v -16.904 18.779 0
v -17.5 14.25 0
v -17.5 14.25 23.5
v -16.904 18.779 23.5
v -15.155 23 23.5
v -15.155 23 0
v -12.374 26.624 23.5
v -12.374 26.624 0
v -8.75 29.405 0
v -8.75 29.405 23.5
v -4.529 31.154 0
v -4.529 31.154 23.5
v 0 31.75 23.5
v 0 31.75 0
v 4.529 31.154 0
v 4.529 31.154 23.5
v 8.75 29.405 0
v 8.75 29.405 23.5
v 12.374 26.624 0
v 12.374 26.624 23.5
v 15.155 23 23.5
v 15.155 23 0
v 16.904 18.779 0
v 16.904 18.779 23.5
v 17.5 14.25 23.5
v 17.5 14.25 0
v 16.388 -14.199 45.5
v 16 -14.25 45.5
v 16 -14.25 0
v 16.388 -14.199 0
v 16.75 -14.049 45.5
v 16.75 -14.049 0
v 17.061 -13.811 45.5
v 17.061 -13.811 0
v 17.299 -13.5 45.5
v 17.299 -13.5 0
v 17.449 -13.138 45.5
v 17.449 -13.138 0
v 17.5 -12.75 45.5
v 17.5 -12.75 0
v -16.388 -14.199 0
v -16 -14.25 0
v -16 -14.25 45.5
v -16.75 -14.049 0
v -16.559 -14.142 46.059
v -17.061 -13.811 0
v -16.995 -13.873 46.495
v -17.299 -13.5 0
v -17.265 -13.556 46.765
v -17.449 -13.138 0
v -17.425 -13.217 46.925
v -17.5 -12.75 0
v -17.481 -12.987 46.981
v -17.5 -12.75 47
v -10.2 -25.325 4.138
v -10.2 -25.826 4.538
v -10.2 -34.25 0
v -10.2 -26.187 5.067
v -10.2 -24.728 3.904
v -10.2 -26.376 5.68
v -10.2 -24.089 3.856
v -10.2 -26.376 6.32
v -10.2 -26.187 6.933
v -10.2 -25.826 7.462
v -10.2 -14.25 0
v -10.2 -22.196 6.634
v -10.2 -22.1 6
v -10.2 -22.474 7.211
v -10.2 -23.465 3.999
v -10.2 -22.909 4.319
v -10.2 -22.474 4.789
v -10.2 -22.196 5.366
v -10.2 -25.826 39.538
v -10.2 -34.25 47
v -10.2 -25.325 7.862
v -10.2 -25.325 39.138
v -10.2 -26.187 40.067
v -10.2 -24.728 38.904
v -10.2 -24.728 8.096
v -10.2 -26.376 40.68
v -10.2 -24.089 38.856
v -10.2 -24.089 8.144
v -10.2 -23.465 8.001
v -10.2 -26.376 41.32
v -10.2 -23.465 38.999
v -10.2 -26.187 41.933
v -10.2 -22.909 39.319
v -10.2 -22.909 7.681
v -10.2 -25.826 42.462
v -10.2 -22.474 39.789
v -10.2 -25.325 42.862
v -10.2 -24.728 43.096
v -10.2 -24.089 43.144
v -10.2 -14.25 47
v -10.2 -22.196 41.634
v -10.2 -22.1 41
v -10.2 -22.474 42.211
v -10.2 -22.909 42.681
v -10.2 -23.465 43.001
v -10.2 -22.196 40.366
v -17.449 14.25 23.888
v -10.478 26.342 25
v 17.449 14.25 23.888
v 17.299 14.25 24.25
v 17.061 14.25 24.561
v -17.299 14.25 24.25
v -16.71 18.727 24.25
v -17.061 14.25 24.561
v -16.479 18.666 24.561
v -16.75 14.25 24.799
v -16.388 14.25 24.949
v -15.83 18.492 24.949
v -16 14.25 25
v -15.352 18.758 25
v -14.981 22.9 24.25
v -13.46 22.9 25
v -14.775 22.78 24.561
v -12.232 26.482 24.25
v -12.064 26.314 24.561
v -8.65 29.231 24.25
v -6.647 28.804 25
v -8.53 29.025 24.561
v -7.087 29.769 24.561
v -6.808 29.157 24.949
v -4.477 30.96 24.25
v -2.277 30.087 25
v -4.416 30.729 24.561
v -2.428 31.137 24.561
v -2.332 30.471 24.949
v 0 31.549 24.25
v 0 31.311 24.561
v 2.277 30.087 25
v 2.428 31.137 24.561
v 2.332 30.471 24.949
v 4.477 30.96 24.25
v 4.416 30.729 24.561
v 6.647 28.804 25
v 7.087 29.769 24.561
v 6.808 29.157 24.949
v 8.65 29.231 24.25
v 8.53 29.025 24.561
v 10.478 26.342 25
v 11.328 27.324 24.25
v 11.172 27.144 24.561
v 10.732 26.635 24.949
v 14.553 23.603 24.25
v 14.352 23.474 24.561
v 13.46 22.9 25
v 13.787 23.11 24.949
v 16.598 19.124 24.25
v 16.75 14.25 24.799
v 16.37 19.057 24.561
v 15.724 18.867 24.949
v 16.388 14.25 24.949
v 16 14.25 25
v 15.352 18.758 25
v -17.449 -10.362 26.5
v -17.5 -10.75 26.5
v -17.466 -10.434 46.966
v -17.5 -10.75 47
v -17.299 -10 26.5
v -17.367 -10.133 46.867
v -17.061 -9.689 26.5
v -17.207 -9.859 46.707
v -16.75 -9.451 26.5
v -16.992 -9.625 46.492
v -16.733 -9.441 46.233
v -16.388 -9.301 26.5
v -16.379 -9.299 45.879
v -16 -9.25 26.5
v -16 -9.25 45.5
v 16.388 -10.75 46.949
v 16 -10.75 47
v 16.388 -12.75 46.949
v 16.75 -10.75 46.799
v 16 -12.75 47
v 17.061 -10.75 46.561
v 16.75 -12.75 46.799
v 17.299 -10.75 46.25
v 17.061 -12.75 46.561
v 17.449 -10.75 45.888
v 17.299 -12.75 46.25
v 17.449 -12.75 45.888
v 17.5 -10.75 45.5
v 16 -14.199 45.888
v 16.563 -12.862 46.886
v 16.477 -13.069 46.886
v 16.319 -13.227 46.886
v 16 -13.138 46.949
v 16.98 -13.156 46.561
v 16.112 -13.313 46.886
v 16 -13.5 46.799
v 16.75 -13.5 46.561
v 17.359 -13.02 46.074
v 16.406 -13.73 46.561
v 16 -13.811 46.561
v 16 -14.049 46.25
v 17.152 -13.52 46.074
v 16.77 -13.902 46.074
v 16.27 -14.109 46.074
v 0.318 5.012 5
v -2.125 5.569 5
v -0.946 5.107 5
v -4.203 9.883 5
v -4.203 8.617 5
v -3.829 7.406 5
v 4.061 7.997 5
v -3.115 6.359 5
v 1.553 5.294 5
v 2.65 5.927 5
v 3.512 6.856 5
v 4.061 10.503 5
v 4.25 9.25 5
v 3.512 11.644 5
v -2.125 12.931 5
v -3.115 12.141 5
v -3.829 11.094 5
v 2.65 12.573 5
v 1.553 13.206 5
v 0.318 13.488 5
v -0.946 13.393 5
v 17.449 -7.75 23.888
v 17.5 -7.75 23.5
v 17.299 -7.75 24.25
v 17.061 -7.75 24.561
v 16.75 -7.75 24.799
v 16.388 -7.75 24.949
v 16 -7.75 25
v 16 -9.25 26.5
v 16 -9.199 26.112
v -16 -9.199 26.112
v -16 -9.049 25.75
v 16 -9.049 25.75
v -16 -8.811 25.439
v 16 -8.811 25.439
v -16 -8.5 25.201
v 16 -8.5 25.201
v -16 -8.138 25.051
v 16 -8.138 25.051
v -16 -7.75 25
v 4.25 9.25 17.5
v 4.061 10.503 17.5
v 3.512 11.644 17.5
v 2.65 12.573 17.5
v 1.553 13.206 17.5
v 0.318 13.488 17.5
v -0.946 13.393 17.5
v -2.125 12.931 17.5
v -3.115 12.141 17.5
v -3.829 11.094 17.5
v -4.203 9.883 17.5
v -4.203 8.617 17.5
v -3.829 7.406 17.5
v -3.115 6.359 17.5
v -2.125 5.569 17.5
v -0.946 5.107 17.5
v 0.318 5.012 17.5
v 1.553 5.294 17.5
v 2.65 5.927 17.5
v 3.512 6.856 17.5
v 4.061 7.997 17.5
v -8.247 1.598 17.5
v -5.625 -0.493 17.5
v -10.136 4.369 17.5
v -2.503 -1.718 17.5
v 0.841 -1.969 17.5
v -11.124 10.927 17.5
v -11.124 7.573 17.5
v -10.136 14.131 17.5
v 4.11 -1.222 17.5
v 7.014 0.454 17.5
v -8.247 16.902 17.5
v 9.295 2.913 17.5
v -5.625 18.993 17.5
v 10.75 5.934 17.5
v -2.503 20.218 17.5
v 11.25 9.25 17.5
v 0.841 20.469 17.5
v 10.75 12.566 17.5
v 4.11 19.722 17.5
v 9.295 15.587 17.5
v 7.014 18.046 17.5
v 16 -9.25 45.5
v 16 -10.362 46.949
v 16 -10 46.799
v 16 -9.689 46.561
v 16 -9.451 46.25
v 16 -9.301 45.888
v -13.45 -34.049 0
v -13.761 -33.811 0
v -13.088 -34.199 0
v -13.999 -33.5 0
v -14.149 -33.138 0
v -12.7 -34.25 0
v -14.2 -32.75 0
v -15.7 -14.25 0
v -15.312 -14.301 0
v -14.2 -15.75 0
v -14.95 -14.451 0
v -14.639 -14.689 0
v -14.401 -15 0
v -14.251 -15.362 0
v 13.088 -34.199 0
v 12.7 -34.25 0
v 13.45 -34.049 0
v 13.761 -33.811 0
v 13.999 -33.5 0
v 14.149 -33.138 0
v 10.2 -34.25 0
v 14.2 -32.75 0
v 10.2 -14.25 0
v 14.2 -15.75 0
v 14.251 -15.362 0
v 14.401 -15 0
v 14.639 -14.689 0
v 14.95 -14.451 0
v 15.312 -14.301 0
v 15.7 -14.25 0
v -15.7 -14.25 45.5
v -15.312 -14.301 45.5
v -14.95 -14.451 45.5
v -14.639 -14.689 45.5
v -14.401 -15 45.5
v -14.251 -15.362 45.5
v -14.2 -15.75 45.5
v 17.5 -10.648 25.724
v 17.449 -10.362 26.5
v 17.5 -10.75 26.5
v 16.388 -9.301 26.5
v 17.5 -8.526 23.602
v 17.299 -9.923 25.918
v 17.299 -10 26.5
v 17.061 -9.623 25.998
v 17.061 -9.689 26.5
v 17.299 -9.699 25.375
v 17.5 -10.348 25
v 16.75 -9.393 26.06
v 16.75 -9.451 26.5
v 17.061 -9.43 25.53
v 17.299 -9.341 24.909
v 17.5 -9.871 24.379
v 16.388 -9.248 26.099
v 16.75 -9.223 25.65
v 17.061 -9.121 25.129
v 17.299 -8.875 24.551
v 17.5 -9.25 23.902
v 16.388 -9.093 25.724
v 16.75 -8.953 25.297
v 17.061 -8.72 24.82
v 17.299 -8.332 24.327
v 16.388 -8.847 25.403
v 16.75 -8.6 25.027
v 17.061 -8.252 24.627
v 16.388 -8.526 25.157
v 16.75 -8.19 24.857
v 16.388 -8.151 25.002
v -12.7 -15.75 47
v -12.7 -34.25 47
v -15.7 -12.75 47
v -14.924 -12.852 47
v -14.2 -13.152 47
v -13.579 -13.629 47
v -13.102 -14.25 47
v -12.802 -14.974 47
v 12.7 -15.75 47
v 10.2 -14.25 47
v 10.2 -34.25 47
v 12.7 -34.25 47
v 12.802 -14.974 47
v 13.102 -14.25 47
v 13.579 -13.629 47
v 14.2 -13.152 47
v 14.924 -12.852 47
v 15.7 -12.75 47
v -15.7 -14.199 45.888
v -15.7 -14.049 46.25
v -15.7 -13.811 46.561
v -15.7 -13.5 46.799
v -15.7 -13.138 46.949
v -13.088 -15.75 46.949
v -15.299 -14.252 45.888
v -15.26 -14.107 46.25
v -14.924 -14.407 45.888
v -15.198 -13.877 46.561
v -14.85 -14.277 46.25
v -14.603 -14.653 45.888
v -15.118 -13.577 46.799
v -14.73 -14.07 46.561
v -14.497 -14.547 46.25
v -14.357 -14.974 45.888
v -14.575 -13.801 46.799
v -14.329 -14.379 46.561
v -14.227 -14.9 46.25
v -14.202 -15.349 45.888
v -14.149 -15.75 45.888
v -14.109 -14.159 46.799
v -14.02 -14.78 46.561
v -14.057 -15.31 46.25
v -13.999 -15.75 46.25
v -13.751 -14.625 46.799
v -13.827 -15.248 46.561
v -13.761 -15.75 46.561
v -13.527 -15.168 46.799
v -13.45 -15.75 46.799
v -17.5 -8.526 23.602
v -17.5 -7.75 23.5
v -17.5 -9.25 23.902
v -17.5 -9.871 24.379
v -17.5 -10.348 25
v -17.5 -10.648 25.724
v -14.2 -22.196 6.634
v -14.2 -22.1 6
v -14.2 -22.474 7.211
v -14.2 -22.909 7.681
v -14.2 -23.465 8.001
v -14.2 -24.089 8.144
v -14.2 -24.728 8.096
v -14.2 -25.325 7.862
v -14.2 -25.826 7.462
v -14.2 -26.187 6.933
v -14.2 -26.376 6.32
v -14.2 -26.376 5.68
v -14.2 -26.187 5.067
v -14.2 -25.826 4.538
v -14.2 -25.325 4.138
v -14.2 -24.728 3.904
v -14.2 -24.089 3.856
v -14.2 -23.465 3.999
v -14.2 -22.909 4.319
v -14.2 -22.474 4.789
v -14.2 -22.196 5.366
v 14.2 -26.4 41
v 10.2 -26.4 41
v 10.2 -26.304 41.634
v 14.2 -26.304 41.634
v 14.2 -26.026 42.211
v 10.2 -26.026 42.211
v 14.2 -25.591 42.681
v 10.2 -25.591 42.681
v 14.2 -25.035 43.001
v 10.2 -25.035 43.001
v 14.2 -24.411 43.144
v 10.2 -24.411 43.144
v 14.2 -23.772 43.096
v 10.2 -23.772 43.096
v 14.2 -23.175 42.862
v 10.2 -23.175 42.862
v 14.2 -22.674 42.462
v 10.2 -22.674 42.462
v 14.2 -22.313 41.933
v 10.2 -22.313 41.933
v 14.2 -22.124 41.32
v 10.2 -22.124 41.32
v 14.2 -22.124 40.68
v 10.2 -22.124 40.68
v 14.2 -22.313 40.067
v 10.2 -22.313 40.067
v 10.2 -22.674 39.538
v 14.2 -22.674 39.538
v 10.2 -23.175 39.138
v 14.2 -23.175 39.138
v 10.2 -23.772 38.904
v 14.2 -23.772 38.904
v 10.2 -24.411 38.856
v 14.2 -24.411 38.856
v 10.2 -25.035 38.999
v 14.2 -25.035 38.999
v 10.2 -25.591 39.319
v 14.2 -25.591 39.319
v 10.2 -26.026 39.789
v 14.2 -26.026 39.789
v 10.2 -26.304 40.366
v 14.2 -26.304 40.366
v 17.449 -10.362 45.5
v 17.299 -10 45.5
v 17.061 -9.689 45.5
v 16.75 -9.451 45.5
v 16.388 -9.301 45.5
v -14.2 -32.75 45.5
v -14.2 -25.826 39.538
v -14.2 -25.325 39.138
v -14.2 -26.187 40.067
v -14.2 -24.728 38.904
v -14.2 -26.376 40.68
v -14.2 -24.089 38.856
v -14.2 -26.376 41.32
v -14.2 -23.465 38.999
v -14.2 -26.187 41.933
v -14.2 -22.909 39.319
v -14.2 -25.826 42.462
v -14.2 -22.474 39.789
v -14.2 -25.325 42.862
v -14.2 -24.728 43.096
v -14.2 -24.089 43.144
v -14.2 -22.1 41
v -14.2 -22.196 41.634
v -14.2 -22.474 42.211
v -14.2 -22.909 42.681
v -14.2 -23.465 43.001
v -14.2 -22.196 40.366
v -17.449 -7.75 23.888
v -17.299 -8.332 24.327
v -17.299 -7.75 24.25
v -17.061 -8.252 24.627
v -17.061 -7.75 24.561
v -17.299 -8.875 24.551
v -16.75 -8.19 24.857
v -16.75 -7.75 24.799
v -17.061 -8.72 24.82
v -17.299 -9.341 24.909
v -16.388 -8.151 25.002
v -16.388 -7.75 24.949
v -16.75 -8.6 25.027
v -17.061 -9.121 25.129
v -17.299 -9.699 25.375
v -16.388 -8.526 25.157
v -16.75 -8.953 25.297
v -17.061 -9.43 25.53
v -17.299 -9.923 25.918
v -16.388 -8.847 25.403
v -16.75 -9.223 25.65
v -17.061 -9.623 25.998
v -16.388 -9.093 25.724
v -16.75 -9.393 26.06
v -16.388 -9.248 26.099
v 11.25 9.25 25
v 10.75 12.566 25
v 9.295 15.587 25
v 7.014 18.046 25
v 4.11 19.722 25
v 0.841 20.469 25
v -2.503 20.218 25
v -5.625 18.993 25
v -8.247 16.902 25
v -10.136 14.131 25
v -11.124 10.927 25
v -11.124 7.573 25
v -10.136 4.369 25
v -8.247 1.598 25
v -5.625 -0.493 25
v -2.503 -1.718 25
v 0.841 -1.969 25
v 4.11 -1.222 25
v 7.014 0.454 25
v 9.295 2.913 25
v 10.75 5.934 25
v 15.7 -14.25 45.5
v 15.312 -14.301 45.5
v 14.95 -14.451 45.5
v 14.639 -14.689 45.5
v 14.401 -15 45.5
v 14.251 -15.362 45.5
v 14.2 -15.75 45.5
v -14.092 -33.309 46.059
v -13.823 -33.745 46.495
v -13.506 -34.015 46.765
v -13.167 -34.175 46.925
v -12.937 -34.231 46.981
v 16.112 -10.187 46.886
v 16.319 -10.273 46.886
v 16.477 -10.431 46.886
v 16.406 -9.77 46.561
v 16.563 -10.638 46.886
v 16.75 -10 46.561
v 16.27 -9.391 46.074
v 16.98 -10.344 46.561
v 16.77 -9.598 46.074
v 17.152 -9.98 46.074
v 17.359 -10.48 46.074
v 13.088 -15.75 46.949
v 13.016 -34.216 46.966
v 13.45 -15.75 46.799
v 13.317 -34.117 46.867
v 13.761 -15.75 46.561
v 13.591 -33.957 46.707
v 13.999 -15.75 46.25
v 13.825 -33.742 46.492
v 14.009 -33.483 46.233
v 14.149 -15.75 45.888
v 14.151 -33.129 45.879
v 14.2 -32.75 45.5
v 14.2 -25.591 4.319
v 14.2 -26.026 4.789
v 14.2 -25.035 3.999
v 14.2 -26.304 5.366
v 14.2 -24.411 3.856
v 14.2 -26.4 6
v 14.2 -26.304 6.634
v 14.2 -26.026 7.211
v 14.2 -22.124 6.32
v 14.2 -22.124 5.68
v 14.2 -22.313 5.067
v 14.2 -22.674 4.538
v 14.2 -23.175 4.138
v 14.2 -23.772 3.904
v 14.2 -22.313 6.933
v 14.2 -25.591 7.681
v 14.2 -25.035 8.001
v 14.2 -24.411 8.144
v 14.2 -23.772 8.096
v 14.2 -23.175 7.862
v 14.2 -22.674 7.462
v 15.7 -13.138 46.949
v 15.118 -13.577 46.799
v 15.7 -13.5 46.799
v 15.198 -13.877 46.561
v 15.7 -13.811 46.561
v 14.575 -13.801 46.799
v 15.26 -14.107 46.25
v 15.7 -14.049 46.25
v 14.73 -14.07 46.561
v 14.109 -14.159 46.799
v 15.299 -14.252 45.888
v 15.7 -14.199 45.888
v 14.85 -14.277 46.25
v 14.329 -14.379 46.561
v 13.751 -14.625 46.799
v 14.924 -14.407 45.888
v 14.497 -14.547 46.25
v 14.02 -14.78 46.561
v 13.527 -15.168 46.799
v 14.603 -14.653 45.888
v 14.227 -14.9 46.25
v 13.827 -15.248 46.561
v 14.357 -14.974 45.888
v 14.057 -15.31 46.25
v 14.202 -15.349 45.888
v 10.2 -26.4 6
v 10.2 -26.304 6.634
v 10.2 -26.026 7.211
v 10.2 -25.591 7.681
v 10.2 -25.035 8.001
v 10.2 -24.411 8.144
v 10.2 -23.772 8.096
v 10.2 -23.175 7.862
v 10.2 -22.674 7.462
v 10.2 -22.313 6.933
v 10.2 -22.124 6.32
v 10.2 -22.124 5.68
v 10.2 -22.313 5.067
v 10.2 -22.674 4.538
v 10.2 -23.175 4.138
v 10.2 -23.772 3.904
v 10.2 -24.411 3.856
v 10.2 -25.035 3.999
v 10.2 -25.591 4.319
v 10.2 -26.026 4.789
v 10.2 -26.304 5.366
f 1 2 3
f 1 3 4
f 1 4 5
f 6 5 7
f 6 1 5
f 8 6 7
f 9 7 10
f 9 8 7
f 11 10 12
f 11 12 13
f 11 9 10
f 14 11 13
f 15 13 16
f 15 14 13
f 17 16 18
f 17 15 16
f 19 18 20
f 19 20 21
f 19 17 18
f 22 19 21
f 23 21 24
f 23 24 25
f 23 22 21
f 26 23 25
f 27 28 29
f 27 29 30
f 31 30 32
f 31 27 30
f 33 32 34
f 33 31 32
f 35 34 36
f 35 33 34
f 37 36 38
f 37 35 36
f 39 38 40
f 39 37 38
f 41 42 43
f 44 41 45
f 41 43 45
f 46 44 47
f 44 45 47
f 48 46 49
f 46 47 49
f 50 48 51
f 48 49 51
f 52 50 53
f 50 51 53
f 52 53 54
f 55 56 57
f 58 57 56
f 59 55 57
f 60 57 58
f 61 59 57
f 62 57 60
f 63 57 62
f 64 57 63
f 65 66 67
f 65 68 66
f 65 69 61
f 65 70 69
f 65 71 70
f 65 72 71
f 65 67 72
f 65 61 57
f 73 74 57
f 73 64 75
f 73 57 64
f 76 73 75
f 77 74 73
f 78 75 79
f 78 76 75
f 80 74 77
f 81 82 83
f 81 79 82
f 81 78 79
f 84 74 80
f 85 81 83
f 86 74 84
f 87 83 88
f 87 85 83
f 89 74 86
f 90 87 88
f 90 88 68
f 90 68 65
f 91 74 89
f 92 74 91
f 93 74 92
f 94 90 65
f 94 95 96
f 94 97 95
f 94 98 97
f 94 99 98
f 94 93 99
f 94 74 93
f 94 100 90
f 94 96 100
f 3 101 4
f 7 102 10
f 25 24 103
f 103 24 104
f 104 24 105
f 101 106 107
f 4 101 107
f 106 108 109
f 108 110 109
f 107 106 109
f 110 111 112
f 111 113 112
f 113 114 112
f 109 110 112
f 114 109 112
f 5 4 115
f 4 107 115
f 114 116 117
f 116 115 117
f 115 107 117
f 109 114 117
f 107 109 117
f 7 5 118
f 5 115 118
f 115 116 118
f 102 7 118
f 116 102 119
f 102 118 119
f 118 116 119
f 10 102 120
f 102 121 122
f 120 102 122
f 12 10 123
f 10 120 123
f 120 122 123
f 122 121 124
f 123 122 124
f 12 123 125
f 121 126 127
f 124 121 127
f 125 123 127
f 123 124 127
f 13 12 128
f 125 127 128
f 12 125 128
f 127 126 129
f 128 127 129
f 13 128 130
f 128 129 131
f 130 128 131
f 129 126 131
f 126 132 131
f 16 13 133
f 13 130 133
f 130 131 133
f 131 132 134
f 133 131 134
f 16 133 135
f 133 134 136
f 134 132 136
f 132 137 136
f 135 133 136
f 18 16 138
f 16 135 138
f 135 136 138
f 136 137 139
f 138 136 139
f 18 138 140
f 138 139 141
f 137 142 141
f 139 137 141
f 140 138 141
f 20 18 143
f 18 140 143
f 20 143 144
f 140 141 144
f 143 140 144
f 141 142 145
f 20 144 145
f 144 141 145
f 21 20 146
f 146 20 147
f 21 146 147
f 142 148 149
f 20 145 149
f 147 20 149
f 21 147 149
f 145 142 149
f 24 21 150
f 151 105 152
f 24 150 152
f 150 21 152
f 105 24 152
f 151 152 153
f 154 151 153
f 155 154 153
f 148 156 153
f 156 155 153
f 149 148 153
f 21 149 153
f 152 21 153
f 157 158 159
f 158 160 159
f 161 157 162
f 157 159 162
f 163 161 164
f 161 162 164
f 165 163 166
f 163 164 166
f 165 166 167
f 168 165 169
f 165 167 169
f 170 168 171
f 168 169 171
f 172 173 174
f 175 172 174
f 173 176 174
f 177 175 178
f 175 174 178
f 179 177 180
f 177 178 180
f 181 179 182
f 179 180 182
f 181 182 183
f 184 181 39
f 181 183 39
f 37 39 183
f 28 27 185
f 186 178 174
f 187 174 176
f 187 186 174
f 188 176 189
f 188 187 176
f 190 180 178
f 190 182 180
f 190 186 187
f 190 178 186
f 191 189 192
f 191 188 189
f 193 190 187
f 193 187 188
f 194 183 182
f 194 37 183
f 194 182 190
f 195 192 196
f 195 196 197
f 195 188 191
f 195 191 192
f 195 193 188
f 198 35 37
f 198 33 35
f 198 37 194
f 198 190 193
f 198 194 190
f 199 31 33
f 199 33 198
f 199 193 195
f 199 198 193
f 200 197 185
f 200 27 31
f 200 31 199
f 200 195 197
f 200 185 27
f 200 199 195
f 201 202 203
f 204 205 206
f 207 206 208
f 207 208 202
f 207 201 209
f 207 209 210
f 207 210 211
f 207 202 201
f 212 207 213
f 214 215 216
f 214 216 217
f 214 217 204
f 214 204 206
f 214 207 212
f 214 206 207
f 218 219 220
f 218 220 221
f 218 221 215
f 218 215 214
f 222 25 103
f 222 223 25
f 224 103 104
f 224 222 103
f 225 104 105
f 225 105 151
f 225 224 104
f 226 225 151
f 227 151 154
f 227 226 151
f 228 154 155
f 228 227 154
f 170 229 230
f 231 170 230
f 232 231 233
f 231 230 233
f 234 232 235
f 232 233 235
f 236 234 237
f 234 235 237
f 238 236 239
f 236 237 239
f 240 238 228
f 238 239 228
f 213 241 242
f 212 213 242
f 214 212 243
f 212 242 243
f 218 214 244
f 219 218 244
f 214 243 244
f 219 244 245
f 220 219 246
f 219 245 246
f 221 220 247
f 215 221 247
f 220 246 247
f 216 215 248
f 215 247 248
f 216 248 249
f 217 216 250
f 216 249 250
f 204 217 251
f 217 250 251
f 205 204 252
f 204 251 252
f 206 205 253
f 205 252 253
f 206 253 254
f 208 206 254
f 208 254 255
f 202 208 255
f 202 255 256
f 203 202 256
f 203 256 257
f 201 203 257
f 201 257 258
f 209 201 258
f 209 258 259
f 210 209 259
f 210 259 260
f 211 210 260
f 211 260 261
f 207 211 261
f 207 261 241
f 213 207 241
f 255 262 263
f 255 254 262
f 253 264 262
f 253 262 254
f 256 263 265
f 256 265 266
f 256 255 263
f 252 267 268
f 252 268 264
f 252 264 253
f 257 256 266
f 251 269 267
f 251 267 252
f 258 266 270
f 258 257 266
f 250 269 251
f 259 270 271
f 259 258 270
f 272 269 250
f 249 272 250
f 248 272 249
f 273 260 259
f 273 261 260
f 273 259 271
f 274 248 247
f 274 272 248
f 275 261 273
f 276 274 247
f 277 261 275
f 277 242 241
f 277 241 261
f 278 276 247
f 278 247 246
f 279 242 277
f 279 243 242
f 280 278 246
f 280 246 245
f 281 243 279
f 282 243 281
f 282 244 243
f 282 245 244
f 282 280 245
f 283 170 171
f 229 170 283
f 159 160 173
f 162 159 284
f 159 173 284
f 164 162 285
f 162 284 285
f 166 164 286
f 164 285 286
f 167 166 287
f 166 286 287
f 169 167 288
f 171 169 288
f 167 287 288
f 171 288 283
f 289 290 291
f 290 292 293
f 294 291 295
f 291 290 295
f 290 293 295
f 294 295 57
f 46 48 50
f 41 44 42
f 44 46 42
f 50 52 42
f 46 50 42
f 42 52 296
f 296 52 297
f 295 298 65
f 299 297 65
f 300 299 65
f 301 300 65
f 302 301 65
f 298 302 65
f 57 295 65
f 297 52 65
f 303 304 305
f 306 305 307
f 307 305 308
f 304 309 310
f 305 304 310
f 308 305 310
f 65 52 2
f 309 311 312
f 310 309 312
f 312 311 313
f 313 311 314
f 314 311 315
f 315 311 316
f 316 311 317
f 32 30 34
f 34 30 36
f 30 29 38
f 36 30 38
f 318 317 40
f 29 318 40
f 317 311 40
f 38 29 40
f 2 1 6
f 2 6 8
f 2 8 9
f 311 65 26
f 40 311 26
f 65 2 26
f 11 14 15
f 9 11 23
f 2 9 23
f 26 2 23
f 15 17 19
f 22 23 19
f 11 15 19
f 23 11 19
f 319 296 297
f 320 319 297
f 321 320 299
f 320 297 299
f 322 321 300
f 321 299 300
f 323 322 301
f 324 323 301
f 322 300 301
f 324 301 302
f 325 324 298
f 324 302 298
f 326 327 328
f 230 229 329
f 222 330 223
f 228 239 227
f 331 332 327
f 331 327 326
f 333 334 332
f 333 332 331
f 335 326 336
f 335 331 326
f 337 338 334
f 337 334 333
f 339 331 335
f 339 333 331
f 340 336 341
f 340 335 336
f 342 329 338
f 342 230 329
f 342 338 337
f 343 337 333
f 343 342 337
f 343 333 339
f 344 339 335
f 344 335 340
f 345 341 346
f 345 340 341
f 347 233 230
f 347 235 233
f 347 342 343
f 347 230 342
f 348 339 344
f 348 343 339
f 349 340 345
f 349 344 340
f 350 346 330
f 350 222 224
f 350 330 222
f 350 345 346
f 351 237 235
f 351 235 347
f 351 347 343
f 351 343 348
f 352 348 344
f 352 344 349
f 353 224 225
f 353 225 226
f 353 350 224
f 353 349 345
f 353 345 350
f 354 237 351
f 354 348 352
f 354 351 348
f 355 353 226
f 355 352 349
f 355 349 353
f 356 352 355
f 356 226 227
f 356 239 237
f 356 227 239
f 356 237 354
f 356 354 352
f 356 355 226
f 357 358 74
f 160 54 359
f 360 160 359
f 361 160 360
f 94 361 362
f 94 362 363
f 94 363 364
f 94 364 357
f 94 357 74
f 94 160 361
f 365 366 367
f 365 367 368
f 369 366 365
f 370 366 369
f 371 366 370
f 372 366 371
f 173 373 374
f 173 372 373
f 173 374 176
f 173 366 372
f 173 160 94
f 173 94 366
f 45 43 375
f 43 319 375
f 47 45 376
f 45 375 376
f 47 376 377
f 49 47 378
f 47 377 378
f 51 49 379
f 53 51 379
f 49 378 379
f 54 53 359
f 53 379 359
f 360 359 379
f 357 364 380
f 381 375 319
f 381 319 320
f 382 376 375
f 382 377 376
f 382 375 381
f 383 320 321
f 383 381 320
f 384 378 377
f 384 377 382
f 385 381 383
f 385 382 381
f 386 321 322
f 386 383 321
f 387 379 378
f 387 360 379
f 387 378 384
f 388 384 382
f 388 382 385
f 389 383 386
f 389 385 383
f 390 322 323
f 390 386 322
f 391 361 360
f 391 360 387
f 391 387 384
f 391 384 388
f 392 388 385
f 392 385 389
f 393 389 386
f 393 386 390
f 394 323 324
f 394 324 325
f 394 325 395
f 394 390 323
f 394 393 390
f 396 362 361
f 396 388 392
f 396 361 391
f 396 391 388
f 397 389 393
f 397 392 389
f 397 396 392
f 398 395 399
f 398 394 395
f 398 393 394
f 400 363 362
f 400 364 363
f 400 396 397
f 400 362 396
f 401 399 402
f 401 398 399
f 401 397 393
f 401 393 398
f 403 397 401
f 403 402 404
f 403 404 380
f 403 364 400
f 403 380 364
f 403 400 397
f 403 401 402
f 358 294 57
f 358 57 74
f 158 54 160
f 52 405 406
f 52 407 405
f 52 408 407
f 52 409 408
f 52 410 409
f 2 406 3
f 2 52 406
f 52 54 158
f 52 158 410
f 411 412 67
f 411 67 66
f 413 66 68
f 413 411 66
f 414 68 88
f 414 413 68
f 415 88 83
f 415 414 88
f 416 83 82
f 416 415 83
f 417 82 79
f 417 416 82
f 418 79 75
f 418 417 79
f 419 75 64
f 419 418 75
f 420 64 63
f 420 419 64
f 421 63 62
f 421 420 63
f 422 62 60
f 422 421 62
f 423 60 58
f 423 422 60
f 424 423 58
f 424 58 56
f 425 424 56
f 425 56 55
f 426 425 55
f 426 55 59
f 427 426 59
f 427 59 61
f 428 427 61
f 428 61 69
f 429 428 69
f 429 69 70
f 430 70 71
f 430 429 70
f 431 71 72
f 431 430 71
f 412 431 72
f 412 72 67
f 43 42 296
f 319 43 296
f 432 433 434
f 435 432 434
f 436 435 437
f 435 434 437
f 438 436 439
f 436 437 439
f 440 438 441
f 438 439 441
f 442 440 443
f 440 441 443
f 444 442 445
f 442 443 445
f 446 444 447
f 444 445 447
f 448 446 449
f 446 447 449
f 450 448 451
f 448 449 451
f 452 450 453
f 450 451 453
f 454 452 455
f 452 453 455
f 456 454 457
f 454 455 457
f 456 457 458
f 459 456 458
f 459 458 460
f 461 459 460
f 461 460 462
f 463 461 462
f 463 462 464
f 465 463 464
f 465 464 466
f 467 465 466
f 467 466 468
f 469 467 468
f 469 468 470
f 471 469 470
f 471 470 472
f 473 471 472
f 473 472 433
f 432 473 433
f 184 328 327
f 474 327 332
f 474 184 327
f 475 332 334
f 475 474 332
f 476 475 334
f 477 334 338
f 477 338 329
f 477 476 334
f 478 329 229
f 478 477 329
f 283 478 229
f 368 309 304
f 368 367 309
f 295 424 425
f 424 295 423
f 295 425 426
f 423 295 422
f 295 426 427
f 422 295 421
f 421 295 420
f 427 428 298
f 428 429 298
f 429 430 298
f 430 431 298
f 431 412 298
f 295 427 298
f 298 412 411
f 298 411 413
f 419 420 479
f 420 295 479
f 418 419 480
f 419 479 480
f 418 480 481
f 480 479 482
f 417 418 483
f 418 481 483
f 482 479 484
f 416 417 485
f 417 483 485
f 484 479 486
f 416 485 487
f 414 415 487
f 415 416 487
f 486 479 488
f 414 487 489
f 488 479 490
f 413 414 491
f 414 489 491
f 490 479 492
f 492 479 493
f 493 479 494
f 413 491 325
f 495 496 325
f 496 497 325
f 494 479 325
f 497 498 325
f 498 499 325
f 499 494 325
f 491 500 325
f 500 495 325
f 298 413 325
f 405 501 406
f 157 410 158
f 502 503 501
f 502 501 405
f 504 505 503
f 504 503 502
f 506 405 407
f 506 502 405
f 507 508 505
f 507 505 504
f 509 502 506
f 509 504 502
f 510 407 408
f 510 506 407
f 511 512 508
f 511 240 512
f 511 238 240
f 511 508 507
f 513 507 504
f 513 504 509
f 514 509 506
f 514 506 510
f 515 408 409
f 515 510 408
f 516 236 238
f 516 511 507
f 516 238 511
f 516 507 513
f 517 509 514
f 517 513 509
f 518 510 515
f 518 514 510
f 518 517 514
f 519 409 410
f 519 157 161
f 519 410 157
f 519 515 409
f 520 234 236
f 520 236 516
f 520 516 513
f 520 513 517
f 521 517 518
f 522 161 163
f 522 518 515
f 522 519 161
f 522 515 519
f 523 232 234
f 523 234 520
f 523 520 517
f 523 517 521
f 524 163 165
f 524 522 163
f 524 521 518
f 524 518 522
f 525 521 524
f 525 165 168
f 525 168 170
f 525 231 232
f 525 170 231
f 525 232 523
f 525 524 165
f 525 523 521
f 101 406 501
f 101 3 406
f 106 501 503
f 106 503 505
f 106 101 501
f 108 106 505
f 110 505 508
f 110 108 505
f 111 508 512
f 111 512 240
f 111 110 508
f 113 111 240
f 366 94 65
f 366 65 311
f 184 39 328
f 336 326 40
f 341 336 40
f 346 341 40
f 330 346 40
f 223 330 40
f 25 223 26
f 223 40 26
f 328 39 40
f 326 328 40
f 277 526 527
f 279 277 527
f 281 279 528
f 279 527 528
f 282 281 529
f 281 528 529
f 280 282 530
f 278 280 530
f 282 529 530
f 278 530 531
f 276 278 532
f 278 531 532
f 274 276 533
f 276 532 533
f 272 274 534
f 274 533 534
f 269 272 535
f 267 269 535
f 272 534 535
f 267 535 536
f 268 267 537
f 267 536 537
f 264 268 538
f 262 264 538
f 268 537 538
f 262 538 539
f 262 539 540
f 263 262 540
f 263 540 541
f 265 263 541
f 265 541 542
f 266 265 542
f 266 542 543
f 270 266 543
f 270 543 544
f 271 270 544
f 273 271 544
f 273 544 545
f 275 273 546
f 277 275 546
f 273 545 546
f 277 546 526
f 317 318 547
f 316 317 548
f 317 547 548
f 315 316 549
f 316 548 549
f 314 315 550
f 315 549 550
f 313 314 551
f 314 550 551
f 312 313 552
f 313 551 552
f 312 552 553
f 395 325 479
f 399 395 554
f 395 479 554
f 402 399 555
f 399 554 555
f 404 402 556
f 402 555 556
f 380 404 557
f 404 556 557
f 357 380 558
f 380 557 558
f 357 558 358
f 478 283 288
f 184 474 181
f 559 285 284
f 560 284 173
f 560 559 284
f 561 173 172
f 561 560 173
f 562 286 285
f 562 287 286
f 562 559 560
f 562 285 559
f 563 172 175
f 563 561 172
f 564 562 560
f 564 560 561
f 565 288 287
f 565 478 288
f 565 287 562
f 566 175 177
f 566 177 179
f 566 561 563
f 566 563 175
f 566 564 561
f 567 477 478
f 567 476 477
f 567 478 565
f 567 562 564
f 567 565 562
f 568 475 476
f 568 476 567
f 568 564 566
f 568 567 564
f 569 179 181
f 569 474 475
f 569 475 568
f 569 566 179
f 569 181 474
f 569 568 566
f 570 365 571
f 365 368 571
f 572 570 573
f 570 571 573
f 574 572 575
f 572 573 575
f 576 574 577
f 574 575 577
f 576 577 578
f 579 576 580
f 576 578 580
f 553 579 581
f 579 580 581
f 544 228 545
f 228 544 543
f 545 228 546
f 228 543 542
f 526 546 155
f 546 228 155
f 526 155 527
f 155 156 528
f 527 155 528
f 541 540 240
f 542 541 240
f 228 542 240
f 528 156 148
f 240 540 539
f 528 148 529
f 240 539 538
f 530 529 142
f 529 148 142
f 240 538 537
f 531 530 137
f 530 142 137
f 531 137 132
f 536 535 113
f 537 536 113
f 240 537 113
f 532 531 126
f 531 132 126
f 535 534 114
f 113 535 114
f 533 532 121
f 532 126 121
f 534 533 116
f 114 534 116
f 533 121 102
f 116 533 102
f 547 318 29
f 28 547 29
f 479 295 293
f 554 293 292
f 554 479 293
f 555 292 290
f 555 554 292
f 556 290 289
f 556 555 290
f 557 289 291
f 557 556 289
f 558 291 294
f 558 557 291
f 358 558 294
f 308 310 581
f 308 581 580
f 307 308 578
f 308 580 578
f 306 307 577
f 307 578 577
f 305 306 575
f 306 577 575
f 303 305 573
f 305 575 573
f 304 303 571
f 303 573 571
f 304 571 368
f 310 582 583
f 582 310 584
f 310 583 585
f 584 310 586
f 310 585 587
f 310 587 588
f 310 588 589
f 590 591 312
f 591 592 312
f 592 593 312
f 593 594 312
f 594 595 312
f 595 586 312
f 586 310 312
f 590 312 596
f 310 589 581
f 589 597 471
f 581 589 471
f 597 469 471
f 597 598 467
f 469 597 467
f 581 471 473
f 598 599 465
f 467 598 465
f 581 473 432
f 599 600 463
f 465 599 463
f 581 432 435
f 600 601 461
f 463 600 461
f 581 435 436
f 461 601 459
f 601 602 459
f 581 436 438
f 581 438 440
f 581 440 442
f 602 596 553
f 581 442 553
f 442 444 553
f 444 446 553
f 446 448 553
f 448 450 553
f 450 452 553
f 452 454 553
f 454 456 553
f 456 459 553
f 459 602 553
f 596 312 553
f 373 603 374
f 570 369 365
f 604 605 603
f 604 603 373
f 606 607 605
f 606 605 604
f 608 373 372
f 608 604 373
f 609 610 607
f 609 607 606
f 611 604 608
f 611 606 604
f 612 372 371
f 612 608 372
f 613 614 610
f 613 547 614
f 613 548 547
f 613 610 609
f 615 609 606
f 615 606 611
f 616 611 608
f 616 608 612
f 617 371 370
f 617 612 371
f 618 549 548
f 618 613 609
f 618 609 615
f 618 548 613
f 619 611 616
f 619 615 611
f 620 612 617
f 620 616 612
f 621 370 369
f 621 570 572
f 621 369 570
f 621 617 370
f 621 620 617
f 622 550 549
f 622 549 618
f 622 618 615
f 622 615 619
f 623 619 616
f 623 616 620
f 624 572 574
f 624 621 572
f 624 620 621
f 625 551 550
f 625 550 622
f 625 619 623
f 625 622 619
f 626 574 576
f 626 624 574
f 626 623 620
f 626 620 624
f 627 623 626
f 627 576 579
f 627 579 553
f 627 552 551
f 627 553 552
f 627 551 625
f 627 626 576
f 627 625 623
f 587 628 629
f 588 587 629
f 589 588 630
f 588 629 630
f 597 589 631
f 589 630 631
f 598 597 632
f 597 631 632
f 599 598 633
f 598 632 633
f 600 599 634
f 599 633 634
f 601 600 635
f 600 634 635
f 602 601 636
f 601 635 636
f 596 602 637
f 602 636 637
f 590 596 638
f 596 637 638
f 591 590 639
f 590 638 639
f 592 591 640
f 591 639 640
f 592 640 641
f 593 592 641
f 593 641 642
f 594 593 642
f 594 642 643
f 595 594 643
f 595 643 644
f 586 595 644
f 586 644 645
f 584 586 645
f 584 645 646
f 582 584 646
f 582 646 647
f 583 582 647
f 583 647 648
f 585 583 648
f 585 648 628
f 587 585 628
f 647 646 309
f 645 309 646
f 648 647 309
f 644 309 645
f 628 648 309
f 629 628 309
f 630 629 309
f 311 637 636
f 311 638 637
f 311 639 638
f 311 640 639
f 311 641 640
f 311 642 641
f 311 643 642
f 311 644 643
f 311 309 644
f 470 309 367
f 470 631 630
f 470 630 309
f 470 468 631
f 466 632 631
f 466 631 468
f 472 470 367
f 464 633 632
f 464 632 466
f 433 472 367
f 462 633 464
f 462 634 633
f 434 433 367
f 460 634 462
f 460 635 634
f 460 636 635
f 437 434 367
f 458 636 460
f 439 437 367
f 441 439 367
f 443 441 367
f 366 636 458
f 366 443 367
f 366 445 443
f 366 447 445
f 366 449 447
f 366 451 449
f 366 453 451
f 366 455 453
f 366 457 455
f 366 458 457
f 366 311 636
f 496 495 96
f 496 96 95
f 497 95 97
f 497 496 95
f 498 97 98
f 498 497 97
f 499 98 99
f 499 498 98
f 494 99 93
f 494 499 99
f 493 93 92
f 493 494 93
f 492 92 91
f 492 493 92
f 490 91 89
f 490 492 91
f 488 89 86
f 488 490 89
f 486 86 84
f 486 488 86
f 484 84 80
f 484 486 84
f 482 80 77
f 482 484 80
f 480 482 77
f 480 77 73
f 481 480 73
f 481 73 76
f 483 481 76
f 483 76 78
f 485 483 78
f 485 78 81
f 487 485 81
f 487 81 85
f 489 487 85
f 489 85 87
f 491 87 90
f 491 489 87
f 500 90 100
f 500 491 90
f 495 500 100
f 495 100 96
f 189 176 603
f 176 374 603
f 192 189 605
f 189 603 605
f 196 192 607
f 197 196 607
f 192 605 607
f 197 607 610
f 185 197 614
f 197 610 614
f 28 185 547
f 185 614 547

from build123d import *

# Parameters (mm, degrees)
SKETCH1_W           = 35
SKETCH1_H           = 28.5
BOSS_EXTRUDE1_DEPTH = 25
SKETCH2_R           = 4.25
CUT_EXTRUDE1_DEPTH  = 20
SKETCH3_R           = 11.25
CUT_EXTRUDE2_DEPTH  = 7.5
SKETCH9_W           = 35
SKETCH9_H           = 5
BOSS_EXTRUDE4_DEPTH = 22
SKETCH4_W           = 4
SKETCH4_H           = 47
BOSS_EXTRUDE2_DEPTH = 20
FILLET1_R           = 1.5
CUT_EXTRUDE3_REACH  = 66.415
SKETCH6_R           = 2.15
MIRROR1_START       = -14.2
MIRROR1_OUTLINE_W   = 20
MIRROR1_OUTLINE_H   = 47
MIRROR1_OUTLINE_R   = 2.15
MIRROR1_DEPTH       = 4
MIRROR1_2_DEPTH     = 47
FILLET2_R           = 1.5


with BuildPart() as part:
    # Sketch1 → Boss-Extrude1 (new body)
    with BuildSketch(Plane.XY):
        with BuildLine():
            ThreePointArc((-17.5, 14.25), (0, 31.75), (17.5, 14.25))
            Line((17.5, 14.25), (-17.5, 14.25))
        make_face()
        Rectangle(SKETCH1_W, SKETCH1_H)
    extrude(amount=BOSS_EXTRUDE1_DEPTH)

    # Sketch2 → Cut-Extrude1 (cut)
    with BuildSketch(Plane.XY.offset(25)):
        with Locations((0, 9.25)):
            Circle(SKETCH2_R)
    extrude(amount=-CUT_EXTRUDE1_DEPTH, mode=Mode.SUBTRACT)

    # Sketch3 → Cut-Extrude2 (cut)
    with BuildSketch(Plane.XY.offset(25)):
        with Locations((0, 9.25)):
            Circle(SKETCH3_R)
    extrude(amount=-CUT_EXTRUDE2_DEPTH, mode=Mode.SUBTRACT)

    # Sketch9 → Boss-Extrude4 (add)
    with BuildSketch(Plane.XY.offset(25)):
        with Locations((0, -11.75)):
            Rectangle(SKETCH9_W, SKETCH9_H)
    extrude(amount=BOSS_EXTRUDE4_DEPTH)

    # Sketch4 → Boss-Extrude2 (add)
    with BuildSketch(Plane.XZ.offset(14.25)):
        with Locations((12.2, 23.5)):
            Rectangle(SKETCH4_W, SKETCH4_H)
    extrude(amount=BOSS_EXTRUDE2_DEPTH)

    # Fillet1
    fillet1_edges = [part.edges().sort_by_distance(p)[0] for p in [
        (14.2, -14.25, 23.5),
        (17.5, -14.25, 23.5),
    ]]
    fillet(fillet1_edges, radius=FILLET1_R)

    # Sketch6 → Cut-Extrude3 (cut, up to next)
    with BuildSketch(Plane.ZY.offset(-10.2), mode=Mode.PRIVATE) as cut_extrude3_sk1:
        with Locations(Location((6, -24.25, 0), (0, 0, 270))):
            Circle(SKETCH6_R)
    cut_extrude3_tool1 = extrude(cut_extrude3_sk1.sketch, amount=-CUT_EXTRUDE3_REACH, mode=Mode.PRIVATE) & part.part
    # Sketch6 → Cut-Extrude3 (cut, up to next)
    with BuildSketch(Plane.ZY.offset(-10.2), mode=Mode.PRIVATE) as cut_extrude3_sk2:
        with Locations(Location((41, -24.25, 0), (0, 0, 270))):
            Circle(SKETCH6_R)
    cut_extrude3_tool2 = extrude(cut_extrude3_sk2.sketch, amount=-CUT_EXTRUDE3_REACH, mode=Mode.PRIVATE) & part.part
    add(cut_extrude3_tool1.solids().sort_by_distance((10.2, -24.25, 6))[0], mode=Mode.SUBTRACT)
    add(cut_extrude3_tool2.solids().sort_by_distance((10.2, -24.25, 41))[0], mode=Mode.SUBTRACT)

    # Mirror1: read off the stored shape, not the designer's step
    # Mirror1 outline → Mirror1 (add)
    with BuildSketch(Plane.YZ.offset(MIRROR1_START)):
        with Locations((-24.25, 23.5)):
            Rectangle(MIRROR1_OUTLINE_W, MIRROR1_OUTLINE_H)
        with Locations((-24.25, 6)):
            Circle(MIRROR1_OUTLINE_R, mode=Mode.SUBTRACT)
        with Locations((-24.25, 41)):
            Circle(MIRROR1_OUTLINE_R, mode=Mode.SUBTRACT)
    extrude(amount=MIRROR1_DEPTH)

    # Mirror1 2 outline → Mirror1 2 (add)
    with BuildSketch(Plane.XY):
        with BuildLine():
            Line((-14.2, -14.25), (-15.7, -14.25))
            ThreePointArc((-15.7, -14.25), (-14.639339828, -14.689339828), (-14.2, -15.75))
            Line((-14.2, -15.75), (-14.2, -14.25))
        make_face()
    extrude(amount=MIRROR1_2_DEPTH)

    # Fillet2
    fillet2_edges = [part.edges().sort_by_distance(p)[0] for p in [
        (-17.5, 2.5, 25),
        (17.5, 2.5, 25),
        (-17.5, -9.25, 36),
        (0, -9.25, 25),
        (17.5, -9.25, 36),
        (-16.6, -14.25, 47),
        (0, -9.25, 47),
        (14.2, -25, 47),
        (14.2, -34.25, 23.5),
        (0, 31.75, 25),
        (17.5, -11, 47),
        (15.85, -14.25, 47),
        (17.060660172, -13.810660172, 47),
        (14.639339828, -14.689339828, 47),
        (-14.2, -34.25, 23.5),
        (-14.2, -25, 47),
        (-14.639339828, -14.689339828, 47),
        (-17.5, -14.25, 23.5),
    ]]
    fillet(fillet2_edges, radius=FILLET2_R)


solid = part.part
